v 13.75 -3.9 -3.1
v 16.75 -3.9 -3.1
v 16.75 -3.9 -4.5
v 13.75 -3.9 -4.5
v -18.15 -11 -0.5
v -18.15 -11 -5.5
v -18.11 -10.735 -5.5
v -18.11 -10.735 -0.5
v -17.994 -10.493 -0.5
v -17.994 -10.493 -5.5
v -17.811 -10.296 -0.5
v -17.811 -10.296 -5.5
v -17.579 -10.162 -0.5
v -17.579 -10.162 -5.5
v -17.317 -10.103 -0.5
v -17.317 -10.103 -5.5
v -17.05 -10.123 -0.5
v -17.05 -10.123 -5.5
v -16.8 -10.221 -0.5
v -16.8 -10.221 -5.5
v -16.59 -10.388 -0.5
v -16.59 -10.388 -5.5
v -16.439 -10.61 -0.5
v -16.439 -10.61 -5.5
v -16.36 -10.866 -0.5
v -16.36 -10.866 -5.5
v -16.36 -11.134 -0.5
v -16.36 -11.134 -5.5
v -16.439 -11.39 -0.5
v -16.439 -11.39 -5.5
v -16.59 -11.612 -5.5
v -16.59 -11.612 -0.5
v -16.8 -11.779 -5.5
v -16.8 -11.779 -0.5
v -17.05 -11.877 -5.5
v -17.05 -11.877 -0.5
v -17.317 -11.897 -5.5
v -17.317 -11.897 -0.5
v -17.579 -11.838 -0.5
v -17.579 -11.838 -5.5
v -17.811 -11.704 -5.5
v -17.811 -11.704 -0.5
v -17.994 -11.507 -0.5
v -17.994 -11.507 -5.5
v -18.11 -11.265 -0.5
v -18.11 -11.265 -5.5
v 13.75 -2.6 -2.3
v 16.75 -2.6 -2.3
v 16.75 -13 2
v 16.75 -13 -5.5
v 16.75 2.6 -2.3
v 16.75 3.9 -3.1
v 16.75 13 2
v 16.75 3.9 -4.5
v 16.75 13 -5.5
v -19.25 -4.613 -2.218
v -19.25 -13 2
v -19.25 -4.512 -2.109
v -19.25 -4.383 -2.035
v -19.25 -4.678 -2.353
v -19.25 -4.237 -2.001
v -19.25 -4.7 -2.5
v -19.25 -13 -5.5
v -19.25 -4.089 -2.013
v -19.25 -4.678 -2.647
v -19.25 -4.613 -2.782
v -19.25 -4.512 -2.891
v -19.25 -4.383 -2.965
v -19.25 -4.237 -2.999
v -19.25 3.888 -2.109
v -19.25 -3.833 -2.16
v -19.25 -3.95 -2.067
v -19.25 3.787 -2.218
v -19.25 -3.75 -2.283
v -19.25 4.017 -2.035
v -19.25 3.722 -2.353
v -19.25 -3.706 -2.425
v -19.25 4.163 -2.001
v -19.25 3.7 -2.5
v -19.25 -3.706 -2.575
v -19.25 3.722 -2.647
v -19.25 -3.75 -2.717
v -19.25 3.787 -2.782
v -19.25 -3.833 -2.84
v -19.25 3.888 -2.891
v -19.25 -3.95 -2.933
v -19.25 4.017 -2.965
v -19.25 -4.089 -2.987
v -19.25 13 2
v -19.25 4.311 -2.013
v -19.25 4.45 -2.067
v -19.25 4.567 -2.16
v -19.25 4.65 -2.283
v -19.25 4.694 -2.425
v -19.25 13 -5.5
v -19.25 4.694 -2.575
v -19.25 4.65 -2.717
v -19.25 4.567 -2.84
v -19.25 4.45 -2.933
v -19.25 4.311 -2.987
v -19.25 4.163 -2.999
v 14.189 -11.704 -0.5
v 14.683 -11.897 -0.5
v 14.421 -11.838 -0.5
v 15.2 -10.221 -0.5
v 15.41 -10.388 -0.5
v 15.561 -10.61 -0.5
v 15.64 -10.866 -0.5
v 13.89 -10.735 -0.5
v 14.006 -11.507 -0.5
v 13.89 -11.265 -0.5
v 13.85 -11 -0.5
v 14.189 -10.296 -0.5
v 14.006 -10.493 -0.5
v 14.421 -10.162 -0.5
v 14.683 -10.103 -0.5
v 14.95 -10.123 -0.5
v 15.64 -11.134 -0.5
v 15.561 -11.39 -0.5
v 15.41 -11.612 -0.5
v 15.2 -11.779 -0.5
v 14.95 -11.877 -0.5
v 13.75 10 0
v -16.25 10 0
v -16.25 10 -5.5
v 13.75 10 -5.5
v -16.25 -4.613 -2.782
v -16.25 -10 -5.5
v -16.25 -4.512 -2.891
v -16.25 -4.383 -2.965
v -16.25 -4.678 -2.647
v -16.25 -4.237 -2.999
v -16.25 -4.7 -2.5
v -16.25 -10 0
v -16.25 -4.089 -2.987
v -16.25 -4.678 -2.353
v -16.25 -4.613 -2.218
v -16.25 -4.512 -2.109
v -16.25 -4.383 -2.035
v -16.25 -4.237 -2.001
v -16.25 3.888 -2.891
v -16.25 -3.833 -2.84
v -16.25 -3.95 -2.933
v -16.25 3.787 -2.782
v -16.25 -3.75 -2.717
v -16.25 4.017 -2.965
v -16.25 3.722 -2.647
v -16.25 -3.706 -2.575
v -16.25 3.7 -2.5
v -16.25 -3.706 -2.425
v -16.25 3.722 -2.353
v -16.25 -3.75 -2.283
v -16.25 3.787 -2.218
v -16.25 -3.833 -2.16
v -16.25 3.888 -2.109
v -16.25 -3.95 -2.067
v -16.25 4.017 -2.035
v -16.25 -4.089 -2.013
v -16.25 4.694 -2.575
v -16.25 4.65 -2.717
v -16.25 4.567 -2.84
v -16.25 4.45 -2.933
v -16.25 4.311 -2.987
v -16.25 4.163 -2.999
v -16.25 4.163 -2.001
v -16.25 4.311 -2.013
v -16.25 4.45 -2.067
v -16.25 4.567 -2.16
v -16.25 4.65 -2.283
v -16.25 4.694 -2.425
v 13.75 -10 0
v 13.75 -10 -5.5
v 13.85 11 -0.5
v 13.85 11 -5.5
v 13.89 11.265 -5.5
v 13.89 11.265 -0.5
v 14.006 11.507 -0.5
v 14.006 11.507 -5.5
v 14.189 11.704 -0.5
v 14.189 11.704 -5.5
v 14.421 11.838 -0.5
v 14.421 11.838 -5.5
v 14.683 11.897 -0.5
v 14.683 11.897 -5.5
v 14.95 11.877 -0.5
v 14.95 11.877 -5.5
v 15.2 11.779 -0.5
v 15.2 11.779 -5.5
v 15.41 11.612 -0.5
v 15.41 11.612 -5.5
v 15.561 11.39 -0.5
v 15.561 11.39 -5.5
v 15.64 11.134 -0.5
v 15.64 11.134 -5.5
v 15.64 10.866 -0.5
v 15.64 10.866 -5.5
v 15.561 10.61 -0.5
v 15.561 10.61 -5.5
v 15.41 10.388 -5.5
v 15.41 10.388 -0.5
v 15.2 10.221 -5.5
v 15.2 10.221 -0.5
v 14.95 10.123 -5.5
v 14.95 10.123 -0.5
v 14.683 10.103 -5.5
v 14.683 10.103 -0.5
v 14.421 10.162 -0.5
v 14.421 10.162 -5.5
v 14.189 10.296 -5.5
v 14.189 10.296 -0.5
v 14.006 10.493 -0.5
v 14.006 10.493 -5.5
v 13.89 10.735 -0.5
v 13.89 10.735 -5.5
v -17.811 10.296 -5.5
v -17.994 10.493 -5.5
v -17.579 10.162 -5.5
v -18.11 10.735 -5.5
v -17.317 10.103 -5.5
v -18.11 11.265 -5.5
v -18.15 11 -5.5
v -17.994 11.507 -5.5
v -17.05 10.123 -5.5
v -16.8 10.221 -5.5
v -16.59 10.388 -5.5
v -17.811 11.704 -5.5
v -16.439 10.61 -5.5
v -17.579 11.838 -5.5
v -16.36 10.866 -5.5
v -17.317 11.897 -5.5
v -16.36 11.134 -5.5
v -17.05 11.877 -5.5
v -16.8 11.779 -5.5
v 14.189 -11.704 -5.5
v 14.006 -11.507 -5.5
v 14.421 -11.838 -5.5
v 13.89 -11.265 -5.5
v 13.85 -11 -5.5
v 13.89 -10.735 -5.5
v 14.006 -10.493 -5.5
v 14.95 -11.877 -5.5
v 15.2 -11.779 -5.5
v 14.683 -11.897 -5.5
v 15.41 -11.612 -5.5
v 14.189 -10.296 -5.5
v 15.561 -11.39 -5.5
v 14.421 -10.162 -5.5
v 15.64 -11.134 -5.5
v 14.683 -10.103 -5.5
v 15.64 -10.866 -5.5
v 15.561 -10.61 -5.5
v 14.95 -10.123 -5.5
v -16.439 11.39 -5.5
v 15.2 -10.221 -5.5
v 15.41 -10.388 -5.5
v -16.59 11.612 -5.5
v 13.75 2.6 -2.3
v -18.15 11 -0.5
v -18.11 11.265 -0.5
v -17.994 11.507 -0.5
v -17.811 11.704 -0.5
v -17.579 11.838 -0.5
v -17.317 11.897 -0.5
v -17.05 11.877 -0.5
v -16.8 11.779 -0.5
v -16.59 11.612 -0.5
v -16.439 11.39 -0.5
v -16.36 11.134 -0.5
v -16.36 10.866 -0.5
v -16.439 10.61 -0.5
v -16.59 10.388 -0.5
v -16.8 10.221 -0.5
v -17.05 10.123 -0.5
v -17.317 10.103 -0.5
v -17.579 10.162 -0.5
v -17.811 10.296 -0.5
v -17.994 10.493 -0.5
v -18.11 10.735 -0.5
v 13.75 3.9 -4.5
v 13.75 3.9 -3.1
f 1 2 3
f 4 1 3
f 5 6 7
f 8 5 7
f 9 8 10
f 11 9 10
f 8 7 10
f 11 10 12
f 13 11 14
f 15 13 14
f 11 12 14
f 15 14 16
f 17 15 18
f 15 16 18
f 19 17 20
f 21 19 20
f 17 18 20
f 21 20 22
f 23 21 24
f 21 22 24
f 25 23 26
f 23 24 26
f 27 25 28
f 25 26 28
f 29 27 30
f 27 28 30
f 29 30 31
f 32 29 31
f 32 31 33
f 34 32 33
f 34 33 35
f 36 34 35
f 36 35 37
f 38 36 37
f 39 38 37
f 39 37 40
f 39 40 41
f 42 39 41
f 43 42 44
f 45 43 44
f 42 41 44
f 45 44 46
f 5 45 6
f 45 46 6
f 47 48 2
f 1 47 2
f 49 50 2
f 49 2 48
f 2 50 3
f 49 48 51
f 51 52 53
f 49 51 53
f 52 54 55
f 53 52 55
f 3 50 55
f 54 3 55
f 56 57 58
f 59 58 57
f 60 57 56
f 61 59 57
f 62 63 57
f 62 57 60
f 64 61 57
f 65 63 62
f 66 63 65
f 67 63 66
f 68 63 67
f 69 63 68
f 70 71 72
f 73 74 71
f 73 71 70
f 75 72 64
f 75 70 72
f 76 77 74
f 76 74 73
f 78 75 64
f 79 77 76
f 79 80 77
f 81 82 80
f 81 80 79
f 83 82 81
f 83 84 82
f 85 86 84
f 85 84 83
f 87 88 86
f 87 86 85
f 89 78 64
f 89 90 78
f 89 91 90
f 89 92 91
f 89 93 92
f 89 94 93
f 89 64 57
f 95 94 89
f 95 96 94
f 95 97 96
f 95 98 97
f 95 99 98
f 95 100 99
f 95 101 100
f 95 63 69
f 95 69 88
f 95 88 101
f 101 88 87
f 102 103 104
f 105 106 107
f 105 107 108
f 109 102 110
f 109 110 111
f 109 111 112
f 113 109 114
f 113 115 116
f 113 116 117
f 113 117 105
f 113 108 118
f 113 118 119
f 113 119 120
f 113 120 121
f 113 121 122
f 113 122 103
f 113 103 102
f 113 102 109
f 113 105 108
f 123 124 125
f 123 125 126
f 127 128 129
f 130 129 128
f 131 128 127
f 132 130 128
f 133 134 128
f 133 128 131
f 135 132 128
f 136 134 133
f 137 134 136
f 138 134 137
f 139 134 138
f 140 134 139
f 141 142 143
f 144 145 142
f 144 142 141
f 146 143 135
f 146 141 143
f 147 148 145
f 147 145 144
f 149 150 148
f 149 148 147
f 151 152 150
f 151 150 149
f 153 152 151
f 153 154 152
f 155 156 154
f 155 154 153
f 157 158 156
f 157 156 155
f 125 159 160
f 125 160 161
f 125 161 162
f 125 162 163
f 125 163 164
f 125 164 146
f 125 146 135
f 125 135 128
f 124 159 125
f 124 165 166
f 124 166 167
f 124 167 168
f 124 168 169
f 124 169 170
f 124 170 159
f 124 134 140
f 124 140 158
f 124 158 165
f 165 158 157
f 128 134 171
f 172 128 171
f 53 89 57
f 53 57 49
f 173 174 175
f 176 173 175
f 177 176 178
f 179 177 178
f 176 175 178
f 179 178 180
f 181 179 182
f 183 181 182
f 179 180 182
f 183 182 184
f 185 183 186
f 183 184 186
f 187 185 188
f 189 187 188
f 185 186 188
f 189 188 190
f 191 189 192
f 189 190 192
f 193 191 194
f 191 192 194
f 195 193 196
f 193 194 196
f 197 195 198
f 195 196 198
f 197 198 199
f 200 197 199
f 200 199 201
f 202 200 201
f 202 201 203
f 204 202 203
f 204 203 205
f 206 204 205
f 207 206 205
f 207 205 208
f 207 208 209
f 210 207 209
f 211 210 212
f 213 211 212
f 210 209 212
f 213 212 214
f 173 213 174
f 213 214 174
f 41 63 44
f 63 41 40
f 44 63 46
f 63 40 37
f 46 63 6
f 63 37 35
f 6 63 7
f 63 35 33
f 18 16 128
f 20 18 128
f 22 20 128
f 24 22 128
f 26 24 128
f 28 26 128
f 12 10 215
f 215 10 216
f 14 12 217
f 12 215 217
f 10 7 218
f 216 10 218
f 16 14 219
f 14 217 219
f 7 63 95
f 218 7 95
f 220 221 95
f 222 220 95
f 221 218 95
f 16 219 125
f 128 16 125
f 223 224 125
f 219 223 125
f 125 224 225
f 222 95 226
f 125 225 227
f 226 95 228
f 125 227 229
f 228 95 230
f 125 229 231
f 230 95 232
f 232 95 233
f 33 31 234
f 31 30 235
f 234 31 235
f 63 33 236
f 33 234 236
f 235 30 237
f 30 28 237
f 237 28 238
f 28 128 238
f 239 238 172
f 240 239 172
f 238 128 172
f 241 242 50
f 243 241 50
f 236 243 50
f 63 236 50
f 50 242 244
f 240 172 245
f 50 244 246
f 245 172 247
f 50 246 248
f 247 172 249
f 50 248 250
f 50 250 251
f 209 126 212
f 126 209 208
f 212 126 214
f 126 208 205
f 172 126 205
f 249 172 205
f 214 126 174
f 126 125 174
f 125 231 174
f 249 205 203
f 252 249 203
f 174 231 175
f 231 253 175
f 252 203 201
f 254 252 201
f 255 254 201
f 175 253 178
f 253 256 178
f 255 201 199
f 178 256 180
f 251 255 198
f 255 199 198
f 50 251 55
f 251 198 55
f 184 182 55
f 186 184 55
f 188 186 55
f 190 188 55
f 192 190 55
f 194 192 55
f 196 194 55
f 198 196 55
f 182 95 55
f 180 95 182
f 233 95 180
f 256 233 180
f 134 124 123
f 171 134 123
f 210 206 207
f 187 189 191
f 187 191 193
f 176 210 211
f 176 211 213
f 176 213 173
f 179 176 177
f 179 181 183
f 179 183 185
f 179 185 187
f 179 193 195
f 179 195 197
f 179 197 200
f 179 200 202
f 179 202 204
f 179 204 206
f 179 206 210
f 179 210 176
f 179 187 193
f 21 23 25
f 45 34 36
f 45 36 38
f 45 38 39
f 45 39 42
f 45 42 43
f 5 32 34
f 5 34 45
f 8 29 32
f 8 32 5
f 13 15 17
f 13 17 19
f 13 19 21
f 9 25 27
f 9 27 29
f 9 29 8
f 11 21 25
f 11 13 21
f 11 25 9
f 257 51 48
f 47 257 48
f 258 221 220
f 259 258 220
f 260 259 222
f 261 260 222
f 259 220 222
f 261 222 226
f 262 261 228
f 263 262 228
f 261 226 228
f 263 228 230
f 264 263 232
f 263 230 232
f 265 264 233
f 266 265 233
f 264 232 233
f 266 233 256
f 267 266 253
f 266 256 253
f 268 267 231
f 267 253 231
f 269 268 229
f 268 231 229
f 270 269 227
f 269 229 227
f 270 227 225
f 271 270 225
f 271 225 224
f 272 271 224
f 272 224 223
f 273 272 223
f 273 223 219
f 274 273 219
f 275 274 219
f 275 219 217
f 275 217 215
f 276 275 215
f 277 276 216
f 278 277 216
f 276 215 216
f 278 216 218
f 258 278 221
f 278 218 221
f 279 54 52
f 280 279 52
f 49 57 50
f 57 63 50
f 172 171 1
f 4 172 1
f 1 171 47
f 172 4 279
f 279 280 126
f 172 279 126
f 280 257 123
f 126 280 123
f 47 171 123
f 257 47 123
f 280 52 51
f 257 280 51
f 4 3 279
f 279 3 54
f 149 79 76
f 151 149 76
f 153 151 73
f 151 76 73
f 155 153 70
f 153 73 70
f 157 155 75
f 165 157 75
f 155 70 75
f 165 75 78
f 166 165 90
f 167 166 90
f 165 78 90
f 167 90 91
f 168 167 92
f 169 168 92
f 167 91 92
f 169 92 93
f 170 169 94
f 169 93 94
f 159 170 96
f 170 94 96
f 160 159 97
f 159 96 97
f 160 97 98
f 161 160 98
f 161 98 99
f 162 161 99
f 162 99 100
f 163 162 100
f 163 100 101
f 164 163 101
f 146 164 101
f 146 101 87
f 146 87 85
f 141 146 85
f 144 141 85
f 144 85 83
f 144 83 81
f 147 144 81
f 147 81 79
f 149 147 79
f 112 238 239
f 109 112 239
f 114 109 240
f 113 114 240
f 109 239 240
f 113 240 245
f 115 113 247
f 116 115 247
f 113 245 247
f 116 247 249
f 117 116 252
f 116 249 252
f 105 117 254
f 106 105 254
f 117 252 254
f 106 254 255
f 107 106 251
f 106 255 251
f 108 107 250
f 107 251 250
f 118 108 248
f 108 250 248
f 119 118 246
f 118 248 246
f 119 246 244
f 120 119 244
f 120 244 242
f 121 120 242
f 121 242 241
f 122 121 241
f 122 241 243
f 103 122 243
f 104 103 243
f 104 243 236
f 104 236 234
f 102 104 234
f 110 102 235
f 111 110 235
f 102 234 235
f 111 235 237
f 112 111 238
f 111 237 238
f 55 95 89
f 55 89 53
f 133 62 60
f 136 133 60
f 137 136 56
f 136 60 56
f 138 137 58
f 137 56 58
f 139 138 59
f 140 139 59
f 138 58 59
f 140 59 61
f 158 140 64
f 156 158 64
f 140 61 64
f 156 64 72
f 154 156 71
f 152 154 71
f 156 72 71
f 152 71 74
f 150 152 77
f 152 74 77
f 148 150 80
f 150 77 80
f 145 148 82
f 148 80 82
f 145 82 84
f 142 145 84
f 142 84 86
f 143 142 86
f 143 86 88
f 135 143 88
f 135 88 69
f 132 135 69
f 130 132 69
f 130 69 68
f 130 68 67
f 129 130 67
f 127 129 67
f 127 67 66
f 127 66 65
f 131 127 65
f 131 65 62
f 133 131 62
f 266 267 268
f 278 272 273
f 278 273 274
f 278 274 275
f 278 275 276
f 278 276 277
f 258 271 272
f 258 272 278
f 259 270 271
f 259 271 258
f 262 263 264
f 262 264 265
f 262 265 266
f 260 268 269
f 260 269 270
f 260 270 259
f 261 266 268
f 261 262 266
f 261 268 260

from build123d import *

# Parameters (mm, degrees)
SKETCH1_W           = 36
SKETCH1_H           = 26
SKETCH1_W_2         = 30
SKETCH1_H_2         = 20
EXTRUDE_THIN1_DEPTH = 5.5
CUT_EXTRUDE1_REACH  = 40.668
SKETCH1_4_W         = 36
SKETCH1_4_H         = 26
SKETCH1_4_W_2       = 30
SKETCH1_4_H_2       = 20
BOSS_EXTRUDE3_DEPTH = 2
SKETCH4_R           = 0.9
CUT_EXTRUDE4_DEPTH  = 5
CUT_EXTRUDE5_REACH  = 40.668
SKETCH5_R           = 0.5


with BuildPart() as part:
    # Sketch1 → Extrude-Thin1 (new body)
    with BuildSketch(Plane.XY):
        with Locations((-1.25, 0)):
            Rectangle(SKETCH1_W, SKETCH1_H)
        with Locations((-1.25, 0)):
            Rectangle(SKETCH1_W_2, SKETCH1_H_2, mode=Mode.SUBTRACT)
    extrude(amount=-EXTRUDE_THIN1_DEPTH)

    # Sketch2 → Cut-Extrude1 (cut, up to next)
    with BuildSketch(Plane(origin=(16.75, 0, 0), x_dir=(0, 0, -1), z_dir=(1, 0, 0)), mode=Mode.PRIVATE) as cut_extrude1_sk1:
        Polygon((4.5, -3.9), (4.5, 3.9), (3.1, 3.9), (2.3, 2.6), (2.3, 0), (2.3, -2.6), (3.1, -3.9), align=None)
    cut_extrude1_tool1 = extrude(cut_extrude1_sk1.sketch, amount=-CUT_EXTRUDE1_REACH, mode=Mode.PRIVATE) & part.part
    add(cut_extrude1_tool1.solids().sort_by_distance((16.75, 0, -3.453763))[0], mode=Mode.SUBTRACT)

    # Sketch1<4> → Boss-Extrude3 (add)
    # profile 1 of 2: a face of its own
    with BuildSketch(Plane.XY):
        with Locations((-1.25, 0)):
            Rectangle(SKETCH1_4_W, SKETCH1_4_H)
        with Locations((-1.25, 0)):
            Rectangle(SKETCH1_4_W_2, SKETCH1_4_H_2, mode=Mode.SUBTRACT)
    # profile 2 of 2: a face of its own
    with BuildSketch(Plane.XY):
        with Locations((-1.25, 0)):
            Rectangle(SKETCH1_4_W_2, SKETCH1_4_H_2)
    extrude(amount=BOSS_EXTRUDE3_DEPTH)

    # Sketch4 → Cut-Extrude4 (cut)
    with BuildSketch(Plane(origin=(0, 0, -5.5), x_dir=(-1, 0, 0), z_dir=(0, 0, -1))):
        with Locations((-14.75, 11)):
            Circle(SKETCH4_R)
        with Locations((17.25, 11)):
            Circle(SKETCH4_R)
        with Locations((17.25, -11)):
            Circle(SKETCH4_R)
        with Locations((-14.75, -11)):
            Circle(SKETCH4_R)
    extrude(amount=-CUT_EXTRUDE4_DEPTH, mode=Mode.SUBTRACT)

    # Sketch5 → Cut-Extrude5 (cut, up to next)
    with BuildSketch(Plane.ZY.offset(19.25), mode=Mode.PRIVATE) as cut_extrude5_sk1:
        with Locations(Location((-2.5, 4.2, 0), (0, 0, 270))):
            Circle(SKETCH5_R)
    cut_extrude5_tool1 = extrude(cut_extrude5_sk1.sketch, amount=-CUT_EXTRUDE5_REACH, mode=Mode.PRIVATE) & part.part
    # Sketch5 → Cut-Extrude5 (cut, up to next)
    with BuildSketch(Plane.ZY.offset(19.25), mode=Mode.PRIVATE) as cut_extrude5_sk2:
        with Locations(Location((-2.5, -4.2, 0), (0, 0, 270))):
            Circle(SKETCH5_R)
    cut_extrude5_tool2 = extrude(cut_extrude5_sk2.sketch, amount=-CUT_EXTRUDE5_REACH, mode=Mode.PRIVATE) & part.part
    add(cut_extrude5_tool1.solids().sort_by_distance((-19.25, 4.2, -2.5))[0], mode=Mode.SUBTRACT)
    add(cut_extrude5_tool2.solids().sort_by_distance((-19.25, -4.2, -2.5))[0], mode=Mode.SUBTRACT)


solid = part.part
